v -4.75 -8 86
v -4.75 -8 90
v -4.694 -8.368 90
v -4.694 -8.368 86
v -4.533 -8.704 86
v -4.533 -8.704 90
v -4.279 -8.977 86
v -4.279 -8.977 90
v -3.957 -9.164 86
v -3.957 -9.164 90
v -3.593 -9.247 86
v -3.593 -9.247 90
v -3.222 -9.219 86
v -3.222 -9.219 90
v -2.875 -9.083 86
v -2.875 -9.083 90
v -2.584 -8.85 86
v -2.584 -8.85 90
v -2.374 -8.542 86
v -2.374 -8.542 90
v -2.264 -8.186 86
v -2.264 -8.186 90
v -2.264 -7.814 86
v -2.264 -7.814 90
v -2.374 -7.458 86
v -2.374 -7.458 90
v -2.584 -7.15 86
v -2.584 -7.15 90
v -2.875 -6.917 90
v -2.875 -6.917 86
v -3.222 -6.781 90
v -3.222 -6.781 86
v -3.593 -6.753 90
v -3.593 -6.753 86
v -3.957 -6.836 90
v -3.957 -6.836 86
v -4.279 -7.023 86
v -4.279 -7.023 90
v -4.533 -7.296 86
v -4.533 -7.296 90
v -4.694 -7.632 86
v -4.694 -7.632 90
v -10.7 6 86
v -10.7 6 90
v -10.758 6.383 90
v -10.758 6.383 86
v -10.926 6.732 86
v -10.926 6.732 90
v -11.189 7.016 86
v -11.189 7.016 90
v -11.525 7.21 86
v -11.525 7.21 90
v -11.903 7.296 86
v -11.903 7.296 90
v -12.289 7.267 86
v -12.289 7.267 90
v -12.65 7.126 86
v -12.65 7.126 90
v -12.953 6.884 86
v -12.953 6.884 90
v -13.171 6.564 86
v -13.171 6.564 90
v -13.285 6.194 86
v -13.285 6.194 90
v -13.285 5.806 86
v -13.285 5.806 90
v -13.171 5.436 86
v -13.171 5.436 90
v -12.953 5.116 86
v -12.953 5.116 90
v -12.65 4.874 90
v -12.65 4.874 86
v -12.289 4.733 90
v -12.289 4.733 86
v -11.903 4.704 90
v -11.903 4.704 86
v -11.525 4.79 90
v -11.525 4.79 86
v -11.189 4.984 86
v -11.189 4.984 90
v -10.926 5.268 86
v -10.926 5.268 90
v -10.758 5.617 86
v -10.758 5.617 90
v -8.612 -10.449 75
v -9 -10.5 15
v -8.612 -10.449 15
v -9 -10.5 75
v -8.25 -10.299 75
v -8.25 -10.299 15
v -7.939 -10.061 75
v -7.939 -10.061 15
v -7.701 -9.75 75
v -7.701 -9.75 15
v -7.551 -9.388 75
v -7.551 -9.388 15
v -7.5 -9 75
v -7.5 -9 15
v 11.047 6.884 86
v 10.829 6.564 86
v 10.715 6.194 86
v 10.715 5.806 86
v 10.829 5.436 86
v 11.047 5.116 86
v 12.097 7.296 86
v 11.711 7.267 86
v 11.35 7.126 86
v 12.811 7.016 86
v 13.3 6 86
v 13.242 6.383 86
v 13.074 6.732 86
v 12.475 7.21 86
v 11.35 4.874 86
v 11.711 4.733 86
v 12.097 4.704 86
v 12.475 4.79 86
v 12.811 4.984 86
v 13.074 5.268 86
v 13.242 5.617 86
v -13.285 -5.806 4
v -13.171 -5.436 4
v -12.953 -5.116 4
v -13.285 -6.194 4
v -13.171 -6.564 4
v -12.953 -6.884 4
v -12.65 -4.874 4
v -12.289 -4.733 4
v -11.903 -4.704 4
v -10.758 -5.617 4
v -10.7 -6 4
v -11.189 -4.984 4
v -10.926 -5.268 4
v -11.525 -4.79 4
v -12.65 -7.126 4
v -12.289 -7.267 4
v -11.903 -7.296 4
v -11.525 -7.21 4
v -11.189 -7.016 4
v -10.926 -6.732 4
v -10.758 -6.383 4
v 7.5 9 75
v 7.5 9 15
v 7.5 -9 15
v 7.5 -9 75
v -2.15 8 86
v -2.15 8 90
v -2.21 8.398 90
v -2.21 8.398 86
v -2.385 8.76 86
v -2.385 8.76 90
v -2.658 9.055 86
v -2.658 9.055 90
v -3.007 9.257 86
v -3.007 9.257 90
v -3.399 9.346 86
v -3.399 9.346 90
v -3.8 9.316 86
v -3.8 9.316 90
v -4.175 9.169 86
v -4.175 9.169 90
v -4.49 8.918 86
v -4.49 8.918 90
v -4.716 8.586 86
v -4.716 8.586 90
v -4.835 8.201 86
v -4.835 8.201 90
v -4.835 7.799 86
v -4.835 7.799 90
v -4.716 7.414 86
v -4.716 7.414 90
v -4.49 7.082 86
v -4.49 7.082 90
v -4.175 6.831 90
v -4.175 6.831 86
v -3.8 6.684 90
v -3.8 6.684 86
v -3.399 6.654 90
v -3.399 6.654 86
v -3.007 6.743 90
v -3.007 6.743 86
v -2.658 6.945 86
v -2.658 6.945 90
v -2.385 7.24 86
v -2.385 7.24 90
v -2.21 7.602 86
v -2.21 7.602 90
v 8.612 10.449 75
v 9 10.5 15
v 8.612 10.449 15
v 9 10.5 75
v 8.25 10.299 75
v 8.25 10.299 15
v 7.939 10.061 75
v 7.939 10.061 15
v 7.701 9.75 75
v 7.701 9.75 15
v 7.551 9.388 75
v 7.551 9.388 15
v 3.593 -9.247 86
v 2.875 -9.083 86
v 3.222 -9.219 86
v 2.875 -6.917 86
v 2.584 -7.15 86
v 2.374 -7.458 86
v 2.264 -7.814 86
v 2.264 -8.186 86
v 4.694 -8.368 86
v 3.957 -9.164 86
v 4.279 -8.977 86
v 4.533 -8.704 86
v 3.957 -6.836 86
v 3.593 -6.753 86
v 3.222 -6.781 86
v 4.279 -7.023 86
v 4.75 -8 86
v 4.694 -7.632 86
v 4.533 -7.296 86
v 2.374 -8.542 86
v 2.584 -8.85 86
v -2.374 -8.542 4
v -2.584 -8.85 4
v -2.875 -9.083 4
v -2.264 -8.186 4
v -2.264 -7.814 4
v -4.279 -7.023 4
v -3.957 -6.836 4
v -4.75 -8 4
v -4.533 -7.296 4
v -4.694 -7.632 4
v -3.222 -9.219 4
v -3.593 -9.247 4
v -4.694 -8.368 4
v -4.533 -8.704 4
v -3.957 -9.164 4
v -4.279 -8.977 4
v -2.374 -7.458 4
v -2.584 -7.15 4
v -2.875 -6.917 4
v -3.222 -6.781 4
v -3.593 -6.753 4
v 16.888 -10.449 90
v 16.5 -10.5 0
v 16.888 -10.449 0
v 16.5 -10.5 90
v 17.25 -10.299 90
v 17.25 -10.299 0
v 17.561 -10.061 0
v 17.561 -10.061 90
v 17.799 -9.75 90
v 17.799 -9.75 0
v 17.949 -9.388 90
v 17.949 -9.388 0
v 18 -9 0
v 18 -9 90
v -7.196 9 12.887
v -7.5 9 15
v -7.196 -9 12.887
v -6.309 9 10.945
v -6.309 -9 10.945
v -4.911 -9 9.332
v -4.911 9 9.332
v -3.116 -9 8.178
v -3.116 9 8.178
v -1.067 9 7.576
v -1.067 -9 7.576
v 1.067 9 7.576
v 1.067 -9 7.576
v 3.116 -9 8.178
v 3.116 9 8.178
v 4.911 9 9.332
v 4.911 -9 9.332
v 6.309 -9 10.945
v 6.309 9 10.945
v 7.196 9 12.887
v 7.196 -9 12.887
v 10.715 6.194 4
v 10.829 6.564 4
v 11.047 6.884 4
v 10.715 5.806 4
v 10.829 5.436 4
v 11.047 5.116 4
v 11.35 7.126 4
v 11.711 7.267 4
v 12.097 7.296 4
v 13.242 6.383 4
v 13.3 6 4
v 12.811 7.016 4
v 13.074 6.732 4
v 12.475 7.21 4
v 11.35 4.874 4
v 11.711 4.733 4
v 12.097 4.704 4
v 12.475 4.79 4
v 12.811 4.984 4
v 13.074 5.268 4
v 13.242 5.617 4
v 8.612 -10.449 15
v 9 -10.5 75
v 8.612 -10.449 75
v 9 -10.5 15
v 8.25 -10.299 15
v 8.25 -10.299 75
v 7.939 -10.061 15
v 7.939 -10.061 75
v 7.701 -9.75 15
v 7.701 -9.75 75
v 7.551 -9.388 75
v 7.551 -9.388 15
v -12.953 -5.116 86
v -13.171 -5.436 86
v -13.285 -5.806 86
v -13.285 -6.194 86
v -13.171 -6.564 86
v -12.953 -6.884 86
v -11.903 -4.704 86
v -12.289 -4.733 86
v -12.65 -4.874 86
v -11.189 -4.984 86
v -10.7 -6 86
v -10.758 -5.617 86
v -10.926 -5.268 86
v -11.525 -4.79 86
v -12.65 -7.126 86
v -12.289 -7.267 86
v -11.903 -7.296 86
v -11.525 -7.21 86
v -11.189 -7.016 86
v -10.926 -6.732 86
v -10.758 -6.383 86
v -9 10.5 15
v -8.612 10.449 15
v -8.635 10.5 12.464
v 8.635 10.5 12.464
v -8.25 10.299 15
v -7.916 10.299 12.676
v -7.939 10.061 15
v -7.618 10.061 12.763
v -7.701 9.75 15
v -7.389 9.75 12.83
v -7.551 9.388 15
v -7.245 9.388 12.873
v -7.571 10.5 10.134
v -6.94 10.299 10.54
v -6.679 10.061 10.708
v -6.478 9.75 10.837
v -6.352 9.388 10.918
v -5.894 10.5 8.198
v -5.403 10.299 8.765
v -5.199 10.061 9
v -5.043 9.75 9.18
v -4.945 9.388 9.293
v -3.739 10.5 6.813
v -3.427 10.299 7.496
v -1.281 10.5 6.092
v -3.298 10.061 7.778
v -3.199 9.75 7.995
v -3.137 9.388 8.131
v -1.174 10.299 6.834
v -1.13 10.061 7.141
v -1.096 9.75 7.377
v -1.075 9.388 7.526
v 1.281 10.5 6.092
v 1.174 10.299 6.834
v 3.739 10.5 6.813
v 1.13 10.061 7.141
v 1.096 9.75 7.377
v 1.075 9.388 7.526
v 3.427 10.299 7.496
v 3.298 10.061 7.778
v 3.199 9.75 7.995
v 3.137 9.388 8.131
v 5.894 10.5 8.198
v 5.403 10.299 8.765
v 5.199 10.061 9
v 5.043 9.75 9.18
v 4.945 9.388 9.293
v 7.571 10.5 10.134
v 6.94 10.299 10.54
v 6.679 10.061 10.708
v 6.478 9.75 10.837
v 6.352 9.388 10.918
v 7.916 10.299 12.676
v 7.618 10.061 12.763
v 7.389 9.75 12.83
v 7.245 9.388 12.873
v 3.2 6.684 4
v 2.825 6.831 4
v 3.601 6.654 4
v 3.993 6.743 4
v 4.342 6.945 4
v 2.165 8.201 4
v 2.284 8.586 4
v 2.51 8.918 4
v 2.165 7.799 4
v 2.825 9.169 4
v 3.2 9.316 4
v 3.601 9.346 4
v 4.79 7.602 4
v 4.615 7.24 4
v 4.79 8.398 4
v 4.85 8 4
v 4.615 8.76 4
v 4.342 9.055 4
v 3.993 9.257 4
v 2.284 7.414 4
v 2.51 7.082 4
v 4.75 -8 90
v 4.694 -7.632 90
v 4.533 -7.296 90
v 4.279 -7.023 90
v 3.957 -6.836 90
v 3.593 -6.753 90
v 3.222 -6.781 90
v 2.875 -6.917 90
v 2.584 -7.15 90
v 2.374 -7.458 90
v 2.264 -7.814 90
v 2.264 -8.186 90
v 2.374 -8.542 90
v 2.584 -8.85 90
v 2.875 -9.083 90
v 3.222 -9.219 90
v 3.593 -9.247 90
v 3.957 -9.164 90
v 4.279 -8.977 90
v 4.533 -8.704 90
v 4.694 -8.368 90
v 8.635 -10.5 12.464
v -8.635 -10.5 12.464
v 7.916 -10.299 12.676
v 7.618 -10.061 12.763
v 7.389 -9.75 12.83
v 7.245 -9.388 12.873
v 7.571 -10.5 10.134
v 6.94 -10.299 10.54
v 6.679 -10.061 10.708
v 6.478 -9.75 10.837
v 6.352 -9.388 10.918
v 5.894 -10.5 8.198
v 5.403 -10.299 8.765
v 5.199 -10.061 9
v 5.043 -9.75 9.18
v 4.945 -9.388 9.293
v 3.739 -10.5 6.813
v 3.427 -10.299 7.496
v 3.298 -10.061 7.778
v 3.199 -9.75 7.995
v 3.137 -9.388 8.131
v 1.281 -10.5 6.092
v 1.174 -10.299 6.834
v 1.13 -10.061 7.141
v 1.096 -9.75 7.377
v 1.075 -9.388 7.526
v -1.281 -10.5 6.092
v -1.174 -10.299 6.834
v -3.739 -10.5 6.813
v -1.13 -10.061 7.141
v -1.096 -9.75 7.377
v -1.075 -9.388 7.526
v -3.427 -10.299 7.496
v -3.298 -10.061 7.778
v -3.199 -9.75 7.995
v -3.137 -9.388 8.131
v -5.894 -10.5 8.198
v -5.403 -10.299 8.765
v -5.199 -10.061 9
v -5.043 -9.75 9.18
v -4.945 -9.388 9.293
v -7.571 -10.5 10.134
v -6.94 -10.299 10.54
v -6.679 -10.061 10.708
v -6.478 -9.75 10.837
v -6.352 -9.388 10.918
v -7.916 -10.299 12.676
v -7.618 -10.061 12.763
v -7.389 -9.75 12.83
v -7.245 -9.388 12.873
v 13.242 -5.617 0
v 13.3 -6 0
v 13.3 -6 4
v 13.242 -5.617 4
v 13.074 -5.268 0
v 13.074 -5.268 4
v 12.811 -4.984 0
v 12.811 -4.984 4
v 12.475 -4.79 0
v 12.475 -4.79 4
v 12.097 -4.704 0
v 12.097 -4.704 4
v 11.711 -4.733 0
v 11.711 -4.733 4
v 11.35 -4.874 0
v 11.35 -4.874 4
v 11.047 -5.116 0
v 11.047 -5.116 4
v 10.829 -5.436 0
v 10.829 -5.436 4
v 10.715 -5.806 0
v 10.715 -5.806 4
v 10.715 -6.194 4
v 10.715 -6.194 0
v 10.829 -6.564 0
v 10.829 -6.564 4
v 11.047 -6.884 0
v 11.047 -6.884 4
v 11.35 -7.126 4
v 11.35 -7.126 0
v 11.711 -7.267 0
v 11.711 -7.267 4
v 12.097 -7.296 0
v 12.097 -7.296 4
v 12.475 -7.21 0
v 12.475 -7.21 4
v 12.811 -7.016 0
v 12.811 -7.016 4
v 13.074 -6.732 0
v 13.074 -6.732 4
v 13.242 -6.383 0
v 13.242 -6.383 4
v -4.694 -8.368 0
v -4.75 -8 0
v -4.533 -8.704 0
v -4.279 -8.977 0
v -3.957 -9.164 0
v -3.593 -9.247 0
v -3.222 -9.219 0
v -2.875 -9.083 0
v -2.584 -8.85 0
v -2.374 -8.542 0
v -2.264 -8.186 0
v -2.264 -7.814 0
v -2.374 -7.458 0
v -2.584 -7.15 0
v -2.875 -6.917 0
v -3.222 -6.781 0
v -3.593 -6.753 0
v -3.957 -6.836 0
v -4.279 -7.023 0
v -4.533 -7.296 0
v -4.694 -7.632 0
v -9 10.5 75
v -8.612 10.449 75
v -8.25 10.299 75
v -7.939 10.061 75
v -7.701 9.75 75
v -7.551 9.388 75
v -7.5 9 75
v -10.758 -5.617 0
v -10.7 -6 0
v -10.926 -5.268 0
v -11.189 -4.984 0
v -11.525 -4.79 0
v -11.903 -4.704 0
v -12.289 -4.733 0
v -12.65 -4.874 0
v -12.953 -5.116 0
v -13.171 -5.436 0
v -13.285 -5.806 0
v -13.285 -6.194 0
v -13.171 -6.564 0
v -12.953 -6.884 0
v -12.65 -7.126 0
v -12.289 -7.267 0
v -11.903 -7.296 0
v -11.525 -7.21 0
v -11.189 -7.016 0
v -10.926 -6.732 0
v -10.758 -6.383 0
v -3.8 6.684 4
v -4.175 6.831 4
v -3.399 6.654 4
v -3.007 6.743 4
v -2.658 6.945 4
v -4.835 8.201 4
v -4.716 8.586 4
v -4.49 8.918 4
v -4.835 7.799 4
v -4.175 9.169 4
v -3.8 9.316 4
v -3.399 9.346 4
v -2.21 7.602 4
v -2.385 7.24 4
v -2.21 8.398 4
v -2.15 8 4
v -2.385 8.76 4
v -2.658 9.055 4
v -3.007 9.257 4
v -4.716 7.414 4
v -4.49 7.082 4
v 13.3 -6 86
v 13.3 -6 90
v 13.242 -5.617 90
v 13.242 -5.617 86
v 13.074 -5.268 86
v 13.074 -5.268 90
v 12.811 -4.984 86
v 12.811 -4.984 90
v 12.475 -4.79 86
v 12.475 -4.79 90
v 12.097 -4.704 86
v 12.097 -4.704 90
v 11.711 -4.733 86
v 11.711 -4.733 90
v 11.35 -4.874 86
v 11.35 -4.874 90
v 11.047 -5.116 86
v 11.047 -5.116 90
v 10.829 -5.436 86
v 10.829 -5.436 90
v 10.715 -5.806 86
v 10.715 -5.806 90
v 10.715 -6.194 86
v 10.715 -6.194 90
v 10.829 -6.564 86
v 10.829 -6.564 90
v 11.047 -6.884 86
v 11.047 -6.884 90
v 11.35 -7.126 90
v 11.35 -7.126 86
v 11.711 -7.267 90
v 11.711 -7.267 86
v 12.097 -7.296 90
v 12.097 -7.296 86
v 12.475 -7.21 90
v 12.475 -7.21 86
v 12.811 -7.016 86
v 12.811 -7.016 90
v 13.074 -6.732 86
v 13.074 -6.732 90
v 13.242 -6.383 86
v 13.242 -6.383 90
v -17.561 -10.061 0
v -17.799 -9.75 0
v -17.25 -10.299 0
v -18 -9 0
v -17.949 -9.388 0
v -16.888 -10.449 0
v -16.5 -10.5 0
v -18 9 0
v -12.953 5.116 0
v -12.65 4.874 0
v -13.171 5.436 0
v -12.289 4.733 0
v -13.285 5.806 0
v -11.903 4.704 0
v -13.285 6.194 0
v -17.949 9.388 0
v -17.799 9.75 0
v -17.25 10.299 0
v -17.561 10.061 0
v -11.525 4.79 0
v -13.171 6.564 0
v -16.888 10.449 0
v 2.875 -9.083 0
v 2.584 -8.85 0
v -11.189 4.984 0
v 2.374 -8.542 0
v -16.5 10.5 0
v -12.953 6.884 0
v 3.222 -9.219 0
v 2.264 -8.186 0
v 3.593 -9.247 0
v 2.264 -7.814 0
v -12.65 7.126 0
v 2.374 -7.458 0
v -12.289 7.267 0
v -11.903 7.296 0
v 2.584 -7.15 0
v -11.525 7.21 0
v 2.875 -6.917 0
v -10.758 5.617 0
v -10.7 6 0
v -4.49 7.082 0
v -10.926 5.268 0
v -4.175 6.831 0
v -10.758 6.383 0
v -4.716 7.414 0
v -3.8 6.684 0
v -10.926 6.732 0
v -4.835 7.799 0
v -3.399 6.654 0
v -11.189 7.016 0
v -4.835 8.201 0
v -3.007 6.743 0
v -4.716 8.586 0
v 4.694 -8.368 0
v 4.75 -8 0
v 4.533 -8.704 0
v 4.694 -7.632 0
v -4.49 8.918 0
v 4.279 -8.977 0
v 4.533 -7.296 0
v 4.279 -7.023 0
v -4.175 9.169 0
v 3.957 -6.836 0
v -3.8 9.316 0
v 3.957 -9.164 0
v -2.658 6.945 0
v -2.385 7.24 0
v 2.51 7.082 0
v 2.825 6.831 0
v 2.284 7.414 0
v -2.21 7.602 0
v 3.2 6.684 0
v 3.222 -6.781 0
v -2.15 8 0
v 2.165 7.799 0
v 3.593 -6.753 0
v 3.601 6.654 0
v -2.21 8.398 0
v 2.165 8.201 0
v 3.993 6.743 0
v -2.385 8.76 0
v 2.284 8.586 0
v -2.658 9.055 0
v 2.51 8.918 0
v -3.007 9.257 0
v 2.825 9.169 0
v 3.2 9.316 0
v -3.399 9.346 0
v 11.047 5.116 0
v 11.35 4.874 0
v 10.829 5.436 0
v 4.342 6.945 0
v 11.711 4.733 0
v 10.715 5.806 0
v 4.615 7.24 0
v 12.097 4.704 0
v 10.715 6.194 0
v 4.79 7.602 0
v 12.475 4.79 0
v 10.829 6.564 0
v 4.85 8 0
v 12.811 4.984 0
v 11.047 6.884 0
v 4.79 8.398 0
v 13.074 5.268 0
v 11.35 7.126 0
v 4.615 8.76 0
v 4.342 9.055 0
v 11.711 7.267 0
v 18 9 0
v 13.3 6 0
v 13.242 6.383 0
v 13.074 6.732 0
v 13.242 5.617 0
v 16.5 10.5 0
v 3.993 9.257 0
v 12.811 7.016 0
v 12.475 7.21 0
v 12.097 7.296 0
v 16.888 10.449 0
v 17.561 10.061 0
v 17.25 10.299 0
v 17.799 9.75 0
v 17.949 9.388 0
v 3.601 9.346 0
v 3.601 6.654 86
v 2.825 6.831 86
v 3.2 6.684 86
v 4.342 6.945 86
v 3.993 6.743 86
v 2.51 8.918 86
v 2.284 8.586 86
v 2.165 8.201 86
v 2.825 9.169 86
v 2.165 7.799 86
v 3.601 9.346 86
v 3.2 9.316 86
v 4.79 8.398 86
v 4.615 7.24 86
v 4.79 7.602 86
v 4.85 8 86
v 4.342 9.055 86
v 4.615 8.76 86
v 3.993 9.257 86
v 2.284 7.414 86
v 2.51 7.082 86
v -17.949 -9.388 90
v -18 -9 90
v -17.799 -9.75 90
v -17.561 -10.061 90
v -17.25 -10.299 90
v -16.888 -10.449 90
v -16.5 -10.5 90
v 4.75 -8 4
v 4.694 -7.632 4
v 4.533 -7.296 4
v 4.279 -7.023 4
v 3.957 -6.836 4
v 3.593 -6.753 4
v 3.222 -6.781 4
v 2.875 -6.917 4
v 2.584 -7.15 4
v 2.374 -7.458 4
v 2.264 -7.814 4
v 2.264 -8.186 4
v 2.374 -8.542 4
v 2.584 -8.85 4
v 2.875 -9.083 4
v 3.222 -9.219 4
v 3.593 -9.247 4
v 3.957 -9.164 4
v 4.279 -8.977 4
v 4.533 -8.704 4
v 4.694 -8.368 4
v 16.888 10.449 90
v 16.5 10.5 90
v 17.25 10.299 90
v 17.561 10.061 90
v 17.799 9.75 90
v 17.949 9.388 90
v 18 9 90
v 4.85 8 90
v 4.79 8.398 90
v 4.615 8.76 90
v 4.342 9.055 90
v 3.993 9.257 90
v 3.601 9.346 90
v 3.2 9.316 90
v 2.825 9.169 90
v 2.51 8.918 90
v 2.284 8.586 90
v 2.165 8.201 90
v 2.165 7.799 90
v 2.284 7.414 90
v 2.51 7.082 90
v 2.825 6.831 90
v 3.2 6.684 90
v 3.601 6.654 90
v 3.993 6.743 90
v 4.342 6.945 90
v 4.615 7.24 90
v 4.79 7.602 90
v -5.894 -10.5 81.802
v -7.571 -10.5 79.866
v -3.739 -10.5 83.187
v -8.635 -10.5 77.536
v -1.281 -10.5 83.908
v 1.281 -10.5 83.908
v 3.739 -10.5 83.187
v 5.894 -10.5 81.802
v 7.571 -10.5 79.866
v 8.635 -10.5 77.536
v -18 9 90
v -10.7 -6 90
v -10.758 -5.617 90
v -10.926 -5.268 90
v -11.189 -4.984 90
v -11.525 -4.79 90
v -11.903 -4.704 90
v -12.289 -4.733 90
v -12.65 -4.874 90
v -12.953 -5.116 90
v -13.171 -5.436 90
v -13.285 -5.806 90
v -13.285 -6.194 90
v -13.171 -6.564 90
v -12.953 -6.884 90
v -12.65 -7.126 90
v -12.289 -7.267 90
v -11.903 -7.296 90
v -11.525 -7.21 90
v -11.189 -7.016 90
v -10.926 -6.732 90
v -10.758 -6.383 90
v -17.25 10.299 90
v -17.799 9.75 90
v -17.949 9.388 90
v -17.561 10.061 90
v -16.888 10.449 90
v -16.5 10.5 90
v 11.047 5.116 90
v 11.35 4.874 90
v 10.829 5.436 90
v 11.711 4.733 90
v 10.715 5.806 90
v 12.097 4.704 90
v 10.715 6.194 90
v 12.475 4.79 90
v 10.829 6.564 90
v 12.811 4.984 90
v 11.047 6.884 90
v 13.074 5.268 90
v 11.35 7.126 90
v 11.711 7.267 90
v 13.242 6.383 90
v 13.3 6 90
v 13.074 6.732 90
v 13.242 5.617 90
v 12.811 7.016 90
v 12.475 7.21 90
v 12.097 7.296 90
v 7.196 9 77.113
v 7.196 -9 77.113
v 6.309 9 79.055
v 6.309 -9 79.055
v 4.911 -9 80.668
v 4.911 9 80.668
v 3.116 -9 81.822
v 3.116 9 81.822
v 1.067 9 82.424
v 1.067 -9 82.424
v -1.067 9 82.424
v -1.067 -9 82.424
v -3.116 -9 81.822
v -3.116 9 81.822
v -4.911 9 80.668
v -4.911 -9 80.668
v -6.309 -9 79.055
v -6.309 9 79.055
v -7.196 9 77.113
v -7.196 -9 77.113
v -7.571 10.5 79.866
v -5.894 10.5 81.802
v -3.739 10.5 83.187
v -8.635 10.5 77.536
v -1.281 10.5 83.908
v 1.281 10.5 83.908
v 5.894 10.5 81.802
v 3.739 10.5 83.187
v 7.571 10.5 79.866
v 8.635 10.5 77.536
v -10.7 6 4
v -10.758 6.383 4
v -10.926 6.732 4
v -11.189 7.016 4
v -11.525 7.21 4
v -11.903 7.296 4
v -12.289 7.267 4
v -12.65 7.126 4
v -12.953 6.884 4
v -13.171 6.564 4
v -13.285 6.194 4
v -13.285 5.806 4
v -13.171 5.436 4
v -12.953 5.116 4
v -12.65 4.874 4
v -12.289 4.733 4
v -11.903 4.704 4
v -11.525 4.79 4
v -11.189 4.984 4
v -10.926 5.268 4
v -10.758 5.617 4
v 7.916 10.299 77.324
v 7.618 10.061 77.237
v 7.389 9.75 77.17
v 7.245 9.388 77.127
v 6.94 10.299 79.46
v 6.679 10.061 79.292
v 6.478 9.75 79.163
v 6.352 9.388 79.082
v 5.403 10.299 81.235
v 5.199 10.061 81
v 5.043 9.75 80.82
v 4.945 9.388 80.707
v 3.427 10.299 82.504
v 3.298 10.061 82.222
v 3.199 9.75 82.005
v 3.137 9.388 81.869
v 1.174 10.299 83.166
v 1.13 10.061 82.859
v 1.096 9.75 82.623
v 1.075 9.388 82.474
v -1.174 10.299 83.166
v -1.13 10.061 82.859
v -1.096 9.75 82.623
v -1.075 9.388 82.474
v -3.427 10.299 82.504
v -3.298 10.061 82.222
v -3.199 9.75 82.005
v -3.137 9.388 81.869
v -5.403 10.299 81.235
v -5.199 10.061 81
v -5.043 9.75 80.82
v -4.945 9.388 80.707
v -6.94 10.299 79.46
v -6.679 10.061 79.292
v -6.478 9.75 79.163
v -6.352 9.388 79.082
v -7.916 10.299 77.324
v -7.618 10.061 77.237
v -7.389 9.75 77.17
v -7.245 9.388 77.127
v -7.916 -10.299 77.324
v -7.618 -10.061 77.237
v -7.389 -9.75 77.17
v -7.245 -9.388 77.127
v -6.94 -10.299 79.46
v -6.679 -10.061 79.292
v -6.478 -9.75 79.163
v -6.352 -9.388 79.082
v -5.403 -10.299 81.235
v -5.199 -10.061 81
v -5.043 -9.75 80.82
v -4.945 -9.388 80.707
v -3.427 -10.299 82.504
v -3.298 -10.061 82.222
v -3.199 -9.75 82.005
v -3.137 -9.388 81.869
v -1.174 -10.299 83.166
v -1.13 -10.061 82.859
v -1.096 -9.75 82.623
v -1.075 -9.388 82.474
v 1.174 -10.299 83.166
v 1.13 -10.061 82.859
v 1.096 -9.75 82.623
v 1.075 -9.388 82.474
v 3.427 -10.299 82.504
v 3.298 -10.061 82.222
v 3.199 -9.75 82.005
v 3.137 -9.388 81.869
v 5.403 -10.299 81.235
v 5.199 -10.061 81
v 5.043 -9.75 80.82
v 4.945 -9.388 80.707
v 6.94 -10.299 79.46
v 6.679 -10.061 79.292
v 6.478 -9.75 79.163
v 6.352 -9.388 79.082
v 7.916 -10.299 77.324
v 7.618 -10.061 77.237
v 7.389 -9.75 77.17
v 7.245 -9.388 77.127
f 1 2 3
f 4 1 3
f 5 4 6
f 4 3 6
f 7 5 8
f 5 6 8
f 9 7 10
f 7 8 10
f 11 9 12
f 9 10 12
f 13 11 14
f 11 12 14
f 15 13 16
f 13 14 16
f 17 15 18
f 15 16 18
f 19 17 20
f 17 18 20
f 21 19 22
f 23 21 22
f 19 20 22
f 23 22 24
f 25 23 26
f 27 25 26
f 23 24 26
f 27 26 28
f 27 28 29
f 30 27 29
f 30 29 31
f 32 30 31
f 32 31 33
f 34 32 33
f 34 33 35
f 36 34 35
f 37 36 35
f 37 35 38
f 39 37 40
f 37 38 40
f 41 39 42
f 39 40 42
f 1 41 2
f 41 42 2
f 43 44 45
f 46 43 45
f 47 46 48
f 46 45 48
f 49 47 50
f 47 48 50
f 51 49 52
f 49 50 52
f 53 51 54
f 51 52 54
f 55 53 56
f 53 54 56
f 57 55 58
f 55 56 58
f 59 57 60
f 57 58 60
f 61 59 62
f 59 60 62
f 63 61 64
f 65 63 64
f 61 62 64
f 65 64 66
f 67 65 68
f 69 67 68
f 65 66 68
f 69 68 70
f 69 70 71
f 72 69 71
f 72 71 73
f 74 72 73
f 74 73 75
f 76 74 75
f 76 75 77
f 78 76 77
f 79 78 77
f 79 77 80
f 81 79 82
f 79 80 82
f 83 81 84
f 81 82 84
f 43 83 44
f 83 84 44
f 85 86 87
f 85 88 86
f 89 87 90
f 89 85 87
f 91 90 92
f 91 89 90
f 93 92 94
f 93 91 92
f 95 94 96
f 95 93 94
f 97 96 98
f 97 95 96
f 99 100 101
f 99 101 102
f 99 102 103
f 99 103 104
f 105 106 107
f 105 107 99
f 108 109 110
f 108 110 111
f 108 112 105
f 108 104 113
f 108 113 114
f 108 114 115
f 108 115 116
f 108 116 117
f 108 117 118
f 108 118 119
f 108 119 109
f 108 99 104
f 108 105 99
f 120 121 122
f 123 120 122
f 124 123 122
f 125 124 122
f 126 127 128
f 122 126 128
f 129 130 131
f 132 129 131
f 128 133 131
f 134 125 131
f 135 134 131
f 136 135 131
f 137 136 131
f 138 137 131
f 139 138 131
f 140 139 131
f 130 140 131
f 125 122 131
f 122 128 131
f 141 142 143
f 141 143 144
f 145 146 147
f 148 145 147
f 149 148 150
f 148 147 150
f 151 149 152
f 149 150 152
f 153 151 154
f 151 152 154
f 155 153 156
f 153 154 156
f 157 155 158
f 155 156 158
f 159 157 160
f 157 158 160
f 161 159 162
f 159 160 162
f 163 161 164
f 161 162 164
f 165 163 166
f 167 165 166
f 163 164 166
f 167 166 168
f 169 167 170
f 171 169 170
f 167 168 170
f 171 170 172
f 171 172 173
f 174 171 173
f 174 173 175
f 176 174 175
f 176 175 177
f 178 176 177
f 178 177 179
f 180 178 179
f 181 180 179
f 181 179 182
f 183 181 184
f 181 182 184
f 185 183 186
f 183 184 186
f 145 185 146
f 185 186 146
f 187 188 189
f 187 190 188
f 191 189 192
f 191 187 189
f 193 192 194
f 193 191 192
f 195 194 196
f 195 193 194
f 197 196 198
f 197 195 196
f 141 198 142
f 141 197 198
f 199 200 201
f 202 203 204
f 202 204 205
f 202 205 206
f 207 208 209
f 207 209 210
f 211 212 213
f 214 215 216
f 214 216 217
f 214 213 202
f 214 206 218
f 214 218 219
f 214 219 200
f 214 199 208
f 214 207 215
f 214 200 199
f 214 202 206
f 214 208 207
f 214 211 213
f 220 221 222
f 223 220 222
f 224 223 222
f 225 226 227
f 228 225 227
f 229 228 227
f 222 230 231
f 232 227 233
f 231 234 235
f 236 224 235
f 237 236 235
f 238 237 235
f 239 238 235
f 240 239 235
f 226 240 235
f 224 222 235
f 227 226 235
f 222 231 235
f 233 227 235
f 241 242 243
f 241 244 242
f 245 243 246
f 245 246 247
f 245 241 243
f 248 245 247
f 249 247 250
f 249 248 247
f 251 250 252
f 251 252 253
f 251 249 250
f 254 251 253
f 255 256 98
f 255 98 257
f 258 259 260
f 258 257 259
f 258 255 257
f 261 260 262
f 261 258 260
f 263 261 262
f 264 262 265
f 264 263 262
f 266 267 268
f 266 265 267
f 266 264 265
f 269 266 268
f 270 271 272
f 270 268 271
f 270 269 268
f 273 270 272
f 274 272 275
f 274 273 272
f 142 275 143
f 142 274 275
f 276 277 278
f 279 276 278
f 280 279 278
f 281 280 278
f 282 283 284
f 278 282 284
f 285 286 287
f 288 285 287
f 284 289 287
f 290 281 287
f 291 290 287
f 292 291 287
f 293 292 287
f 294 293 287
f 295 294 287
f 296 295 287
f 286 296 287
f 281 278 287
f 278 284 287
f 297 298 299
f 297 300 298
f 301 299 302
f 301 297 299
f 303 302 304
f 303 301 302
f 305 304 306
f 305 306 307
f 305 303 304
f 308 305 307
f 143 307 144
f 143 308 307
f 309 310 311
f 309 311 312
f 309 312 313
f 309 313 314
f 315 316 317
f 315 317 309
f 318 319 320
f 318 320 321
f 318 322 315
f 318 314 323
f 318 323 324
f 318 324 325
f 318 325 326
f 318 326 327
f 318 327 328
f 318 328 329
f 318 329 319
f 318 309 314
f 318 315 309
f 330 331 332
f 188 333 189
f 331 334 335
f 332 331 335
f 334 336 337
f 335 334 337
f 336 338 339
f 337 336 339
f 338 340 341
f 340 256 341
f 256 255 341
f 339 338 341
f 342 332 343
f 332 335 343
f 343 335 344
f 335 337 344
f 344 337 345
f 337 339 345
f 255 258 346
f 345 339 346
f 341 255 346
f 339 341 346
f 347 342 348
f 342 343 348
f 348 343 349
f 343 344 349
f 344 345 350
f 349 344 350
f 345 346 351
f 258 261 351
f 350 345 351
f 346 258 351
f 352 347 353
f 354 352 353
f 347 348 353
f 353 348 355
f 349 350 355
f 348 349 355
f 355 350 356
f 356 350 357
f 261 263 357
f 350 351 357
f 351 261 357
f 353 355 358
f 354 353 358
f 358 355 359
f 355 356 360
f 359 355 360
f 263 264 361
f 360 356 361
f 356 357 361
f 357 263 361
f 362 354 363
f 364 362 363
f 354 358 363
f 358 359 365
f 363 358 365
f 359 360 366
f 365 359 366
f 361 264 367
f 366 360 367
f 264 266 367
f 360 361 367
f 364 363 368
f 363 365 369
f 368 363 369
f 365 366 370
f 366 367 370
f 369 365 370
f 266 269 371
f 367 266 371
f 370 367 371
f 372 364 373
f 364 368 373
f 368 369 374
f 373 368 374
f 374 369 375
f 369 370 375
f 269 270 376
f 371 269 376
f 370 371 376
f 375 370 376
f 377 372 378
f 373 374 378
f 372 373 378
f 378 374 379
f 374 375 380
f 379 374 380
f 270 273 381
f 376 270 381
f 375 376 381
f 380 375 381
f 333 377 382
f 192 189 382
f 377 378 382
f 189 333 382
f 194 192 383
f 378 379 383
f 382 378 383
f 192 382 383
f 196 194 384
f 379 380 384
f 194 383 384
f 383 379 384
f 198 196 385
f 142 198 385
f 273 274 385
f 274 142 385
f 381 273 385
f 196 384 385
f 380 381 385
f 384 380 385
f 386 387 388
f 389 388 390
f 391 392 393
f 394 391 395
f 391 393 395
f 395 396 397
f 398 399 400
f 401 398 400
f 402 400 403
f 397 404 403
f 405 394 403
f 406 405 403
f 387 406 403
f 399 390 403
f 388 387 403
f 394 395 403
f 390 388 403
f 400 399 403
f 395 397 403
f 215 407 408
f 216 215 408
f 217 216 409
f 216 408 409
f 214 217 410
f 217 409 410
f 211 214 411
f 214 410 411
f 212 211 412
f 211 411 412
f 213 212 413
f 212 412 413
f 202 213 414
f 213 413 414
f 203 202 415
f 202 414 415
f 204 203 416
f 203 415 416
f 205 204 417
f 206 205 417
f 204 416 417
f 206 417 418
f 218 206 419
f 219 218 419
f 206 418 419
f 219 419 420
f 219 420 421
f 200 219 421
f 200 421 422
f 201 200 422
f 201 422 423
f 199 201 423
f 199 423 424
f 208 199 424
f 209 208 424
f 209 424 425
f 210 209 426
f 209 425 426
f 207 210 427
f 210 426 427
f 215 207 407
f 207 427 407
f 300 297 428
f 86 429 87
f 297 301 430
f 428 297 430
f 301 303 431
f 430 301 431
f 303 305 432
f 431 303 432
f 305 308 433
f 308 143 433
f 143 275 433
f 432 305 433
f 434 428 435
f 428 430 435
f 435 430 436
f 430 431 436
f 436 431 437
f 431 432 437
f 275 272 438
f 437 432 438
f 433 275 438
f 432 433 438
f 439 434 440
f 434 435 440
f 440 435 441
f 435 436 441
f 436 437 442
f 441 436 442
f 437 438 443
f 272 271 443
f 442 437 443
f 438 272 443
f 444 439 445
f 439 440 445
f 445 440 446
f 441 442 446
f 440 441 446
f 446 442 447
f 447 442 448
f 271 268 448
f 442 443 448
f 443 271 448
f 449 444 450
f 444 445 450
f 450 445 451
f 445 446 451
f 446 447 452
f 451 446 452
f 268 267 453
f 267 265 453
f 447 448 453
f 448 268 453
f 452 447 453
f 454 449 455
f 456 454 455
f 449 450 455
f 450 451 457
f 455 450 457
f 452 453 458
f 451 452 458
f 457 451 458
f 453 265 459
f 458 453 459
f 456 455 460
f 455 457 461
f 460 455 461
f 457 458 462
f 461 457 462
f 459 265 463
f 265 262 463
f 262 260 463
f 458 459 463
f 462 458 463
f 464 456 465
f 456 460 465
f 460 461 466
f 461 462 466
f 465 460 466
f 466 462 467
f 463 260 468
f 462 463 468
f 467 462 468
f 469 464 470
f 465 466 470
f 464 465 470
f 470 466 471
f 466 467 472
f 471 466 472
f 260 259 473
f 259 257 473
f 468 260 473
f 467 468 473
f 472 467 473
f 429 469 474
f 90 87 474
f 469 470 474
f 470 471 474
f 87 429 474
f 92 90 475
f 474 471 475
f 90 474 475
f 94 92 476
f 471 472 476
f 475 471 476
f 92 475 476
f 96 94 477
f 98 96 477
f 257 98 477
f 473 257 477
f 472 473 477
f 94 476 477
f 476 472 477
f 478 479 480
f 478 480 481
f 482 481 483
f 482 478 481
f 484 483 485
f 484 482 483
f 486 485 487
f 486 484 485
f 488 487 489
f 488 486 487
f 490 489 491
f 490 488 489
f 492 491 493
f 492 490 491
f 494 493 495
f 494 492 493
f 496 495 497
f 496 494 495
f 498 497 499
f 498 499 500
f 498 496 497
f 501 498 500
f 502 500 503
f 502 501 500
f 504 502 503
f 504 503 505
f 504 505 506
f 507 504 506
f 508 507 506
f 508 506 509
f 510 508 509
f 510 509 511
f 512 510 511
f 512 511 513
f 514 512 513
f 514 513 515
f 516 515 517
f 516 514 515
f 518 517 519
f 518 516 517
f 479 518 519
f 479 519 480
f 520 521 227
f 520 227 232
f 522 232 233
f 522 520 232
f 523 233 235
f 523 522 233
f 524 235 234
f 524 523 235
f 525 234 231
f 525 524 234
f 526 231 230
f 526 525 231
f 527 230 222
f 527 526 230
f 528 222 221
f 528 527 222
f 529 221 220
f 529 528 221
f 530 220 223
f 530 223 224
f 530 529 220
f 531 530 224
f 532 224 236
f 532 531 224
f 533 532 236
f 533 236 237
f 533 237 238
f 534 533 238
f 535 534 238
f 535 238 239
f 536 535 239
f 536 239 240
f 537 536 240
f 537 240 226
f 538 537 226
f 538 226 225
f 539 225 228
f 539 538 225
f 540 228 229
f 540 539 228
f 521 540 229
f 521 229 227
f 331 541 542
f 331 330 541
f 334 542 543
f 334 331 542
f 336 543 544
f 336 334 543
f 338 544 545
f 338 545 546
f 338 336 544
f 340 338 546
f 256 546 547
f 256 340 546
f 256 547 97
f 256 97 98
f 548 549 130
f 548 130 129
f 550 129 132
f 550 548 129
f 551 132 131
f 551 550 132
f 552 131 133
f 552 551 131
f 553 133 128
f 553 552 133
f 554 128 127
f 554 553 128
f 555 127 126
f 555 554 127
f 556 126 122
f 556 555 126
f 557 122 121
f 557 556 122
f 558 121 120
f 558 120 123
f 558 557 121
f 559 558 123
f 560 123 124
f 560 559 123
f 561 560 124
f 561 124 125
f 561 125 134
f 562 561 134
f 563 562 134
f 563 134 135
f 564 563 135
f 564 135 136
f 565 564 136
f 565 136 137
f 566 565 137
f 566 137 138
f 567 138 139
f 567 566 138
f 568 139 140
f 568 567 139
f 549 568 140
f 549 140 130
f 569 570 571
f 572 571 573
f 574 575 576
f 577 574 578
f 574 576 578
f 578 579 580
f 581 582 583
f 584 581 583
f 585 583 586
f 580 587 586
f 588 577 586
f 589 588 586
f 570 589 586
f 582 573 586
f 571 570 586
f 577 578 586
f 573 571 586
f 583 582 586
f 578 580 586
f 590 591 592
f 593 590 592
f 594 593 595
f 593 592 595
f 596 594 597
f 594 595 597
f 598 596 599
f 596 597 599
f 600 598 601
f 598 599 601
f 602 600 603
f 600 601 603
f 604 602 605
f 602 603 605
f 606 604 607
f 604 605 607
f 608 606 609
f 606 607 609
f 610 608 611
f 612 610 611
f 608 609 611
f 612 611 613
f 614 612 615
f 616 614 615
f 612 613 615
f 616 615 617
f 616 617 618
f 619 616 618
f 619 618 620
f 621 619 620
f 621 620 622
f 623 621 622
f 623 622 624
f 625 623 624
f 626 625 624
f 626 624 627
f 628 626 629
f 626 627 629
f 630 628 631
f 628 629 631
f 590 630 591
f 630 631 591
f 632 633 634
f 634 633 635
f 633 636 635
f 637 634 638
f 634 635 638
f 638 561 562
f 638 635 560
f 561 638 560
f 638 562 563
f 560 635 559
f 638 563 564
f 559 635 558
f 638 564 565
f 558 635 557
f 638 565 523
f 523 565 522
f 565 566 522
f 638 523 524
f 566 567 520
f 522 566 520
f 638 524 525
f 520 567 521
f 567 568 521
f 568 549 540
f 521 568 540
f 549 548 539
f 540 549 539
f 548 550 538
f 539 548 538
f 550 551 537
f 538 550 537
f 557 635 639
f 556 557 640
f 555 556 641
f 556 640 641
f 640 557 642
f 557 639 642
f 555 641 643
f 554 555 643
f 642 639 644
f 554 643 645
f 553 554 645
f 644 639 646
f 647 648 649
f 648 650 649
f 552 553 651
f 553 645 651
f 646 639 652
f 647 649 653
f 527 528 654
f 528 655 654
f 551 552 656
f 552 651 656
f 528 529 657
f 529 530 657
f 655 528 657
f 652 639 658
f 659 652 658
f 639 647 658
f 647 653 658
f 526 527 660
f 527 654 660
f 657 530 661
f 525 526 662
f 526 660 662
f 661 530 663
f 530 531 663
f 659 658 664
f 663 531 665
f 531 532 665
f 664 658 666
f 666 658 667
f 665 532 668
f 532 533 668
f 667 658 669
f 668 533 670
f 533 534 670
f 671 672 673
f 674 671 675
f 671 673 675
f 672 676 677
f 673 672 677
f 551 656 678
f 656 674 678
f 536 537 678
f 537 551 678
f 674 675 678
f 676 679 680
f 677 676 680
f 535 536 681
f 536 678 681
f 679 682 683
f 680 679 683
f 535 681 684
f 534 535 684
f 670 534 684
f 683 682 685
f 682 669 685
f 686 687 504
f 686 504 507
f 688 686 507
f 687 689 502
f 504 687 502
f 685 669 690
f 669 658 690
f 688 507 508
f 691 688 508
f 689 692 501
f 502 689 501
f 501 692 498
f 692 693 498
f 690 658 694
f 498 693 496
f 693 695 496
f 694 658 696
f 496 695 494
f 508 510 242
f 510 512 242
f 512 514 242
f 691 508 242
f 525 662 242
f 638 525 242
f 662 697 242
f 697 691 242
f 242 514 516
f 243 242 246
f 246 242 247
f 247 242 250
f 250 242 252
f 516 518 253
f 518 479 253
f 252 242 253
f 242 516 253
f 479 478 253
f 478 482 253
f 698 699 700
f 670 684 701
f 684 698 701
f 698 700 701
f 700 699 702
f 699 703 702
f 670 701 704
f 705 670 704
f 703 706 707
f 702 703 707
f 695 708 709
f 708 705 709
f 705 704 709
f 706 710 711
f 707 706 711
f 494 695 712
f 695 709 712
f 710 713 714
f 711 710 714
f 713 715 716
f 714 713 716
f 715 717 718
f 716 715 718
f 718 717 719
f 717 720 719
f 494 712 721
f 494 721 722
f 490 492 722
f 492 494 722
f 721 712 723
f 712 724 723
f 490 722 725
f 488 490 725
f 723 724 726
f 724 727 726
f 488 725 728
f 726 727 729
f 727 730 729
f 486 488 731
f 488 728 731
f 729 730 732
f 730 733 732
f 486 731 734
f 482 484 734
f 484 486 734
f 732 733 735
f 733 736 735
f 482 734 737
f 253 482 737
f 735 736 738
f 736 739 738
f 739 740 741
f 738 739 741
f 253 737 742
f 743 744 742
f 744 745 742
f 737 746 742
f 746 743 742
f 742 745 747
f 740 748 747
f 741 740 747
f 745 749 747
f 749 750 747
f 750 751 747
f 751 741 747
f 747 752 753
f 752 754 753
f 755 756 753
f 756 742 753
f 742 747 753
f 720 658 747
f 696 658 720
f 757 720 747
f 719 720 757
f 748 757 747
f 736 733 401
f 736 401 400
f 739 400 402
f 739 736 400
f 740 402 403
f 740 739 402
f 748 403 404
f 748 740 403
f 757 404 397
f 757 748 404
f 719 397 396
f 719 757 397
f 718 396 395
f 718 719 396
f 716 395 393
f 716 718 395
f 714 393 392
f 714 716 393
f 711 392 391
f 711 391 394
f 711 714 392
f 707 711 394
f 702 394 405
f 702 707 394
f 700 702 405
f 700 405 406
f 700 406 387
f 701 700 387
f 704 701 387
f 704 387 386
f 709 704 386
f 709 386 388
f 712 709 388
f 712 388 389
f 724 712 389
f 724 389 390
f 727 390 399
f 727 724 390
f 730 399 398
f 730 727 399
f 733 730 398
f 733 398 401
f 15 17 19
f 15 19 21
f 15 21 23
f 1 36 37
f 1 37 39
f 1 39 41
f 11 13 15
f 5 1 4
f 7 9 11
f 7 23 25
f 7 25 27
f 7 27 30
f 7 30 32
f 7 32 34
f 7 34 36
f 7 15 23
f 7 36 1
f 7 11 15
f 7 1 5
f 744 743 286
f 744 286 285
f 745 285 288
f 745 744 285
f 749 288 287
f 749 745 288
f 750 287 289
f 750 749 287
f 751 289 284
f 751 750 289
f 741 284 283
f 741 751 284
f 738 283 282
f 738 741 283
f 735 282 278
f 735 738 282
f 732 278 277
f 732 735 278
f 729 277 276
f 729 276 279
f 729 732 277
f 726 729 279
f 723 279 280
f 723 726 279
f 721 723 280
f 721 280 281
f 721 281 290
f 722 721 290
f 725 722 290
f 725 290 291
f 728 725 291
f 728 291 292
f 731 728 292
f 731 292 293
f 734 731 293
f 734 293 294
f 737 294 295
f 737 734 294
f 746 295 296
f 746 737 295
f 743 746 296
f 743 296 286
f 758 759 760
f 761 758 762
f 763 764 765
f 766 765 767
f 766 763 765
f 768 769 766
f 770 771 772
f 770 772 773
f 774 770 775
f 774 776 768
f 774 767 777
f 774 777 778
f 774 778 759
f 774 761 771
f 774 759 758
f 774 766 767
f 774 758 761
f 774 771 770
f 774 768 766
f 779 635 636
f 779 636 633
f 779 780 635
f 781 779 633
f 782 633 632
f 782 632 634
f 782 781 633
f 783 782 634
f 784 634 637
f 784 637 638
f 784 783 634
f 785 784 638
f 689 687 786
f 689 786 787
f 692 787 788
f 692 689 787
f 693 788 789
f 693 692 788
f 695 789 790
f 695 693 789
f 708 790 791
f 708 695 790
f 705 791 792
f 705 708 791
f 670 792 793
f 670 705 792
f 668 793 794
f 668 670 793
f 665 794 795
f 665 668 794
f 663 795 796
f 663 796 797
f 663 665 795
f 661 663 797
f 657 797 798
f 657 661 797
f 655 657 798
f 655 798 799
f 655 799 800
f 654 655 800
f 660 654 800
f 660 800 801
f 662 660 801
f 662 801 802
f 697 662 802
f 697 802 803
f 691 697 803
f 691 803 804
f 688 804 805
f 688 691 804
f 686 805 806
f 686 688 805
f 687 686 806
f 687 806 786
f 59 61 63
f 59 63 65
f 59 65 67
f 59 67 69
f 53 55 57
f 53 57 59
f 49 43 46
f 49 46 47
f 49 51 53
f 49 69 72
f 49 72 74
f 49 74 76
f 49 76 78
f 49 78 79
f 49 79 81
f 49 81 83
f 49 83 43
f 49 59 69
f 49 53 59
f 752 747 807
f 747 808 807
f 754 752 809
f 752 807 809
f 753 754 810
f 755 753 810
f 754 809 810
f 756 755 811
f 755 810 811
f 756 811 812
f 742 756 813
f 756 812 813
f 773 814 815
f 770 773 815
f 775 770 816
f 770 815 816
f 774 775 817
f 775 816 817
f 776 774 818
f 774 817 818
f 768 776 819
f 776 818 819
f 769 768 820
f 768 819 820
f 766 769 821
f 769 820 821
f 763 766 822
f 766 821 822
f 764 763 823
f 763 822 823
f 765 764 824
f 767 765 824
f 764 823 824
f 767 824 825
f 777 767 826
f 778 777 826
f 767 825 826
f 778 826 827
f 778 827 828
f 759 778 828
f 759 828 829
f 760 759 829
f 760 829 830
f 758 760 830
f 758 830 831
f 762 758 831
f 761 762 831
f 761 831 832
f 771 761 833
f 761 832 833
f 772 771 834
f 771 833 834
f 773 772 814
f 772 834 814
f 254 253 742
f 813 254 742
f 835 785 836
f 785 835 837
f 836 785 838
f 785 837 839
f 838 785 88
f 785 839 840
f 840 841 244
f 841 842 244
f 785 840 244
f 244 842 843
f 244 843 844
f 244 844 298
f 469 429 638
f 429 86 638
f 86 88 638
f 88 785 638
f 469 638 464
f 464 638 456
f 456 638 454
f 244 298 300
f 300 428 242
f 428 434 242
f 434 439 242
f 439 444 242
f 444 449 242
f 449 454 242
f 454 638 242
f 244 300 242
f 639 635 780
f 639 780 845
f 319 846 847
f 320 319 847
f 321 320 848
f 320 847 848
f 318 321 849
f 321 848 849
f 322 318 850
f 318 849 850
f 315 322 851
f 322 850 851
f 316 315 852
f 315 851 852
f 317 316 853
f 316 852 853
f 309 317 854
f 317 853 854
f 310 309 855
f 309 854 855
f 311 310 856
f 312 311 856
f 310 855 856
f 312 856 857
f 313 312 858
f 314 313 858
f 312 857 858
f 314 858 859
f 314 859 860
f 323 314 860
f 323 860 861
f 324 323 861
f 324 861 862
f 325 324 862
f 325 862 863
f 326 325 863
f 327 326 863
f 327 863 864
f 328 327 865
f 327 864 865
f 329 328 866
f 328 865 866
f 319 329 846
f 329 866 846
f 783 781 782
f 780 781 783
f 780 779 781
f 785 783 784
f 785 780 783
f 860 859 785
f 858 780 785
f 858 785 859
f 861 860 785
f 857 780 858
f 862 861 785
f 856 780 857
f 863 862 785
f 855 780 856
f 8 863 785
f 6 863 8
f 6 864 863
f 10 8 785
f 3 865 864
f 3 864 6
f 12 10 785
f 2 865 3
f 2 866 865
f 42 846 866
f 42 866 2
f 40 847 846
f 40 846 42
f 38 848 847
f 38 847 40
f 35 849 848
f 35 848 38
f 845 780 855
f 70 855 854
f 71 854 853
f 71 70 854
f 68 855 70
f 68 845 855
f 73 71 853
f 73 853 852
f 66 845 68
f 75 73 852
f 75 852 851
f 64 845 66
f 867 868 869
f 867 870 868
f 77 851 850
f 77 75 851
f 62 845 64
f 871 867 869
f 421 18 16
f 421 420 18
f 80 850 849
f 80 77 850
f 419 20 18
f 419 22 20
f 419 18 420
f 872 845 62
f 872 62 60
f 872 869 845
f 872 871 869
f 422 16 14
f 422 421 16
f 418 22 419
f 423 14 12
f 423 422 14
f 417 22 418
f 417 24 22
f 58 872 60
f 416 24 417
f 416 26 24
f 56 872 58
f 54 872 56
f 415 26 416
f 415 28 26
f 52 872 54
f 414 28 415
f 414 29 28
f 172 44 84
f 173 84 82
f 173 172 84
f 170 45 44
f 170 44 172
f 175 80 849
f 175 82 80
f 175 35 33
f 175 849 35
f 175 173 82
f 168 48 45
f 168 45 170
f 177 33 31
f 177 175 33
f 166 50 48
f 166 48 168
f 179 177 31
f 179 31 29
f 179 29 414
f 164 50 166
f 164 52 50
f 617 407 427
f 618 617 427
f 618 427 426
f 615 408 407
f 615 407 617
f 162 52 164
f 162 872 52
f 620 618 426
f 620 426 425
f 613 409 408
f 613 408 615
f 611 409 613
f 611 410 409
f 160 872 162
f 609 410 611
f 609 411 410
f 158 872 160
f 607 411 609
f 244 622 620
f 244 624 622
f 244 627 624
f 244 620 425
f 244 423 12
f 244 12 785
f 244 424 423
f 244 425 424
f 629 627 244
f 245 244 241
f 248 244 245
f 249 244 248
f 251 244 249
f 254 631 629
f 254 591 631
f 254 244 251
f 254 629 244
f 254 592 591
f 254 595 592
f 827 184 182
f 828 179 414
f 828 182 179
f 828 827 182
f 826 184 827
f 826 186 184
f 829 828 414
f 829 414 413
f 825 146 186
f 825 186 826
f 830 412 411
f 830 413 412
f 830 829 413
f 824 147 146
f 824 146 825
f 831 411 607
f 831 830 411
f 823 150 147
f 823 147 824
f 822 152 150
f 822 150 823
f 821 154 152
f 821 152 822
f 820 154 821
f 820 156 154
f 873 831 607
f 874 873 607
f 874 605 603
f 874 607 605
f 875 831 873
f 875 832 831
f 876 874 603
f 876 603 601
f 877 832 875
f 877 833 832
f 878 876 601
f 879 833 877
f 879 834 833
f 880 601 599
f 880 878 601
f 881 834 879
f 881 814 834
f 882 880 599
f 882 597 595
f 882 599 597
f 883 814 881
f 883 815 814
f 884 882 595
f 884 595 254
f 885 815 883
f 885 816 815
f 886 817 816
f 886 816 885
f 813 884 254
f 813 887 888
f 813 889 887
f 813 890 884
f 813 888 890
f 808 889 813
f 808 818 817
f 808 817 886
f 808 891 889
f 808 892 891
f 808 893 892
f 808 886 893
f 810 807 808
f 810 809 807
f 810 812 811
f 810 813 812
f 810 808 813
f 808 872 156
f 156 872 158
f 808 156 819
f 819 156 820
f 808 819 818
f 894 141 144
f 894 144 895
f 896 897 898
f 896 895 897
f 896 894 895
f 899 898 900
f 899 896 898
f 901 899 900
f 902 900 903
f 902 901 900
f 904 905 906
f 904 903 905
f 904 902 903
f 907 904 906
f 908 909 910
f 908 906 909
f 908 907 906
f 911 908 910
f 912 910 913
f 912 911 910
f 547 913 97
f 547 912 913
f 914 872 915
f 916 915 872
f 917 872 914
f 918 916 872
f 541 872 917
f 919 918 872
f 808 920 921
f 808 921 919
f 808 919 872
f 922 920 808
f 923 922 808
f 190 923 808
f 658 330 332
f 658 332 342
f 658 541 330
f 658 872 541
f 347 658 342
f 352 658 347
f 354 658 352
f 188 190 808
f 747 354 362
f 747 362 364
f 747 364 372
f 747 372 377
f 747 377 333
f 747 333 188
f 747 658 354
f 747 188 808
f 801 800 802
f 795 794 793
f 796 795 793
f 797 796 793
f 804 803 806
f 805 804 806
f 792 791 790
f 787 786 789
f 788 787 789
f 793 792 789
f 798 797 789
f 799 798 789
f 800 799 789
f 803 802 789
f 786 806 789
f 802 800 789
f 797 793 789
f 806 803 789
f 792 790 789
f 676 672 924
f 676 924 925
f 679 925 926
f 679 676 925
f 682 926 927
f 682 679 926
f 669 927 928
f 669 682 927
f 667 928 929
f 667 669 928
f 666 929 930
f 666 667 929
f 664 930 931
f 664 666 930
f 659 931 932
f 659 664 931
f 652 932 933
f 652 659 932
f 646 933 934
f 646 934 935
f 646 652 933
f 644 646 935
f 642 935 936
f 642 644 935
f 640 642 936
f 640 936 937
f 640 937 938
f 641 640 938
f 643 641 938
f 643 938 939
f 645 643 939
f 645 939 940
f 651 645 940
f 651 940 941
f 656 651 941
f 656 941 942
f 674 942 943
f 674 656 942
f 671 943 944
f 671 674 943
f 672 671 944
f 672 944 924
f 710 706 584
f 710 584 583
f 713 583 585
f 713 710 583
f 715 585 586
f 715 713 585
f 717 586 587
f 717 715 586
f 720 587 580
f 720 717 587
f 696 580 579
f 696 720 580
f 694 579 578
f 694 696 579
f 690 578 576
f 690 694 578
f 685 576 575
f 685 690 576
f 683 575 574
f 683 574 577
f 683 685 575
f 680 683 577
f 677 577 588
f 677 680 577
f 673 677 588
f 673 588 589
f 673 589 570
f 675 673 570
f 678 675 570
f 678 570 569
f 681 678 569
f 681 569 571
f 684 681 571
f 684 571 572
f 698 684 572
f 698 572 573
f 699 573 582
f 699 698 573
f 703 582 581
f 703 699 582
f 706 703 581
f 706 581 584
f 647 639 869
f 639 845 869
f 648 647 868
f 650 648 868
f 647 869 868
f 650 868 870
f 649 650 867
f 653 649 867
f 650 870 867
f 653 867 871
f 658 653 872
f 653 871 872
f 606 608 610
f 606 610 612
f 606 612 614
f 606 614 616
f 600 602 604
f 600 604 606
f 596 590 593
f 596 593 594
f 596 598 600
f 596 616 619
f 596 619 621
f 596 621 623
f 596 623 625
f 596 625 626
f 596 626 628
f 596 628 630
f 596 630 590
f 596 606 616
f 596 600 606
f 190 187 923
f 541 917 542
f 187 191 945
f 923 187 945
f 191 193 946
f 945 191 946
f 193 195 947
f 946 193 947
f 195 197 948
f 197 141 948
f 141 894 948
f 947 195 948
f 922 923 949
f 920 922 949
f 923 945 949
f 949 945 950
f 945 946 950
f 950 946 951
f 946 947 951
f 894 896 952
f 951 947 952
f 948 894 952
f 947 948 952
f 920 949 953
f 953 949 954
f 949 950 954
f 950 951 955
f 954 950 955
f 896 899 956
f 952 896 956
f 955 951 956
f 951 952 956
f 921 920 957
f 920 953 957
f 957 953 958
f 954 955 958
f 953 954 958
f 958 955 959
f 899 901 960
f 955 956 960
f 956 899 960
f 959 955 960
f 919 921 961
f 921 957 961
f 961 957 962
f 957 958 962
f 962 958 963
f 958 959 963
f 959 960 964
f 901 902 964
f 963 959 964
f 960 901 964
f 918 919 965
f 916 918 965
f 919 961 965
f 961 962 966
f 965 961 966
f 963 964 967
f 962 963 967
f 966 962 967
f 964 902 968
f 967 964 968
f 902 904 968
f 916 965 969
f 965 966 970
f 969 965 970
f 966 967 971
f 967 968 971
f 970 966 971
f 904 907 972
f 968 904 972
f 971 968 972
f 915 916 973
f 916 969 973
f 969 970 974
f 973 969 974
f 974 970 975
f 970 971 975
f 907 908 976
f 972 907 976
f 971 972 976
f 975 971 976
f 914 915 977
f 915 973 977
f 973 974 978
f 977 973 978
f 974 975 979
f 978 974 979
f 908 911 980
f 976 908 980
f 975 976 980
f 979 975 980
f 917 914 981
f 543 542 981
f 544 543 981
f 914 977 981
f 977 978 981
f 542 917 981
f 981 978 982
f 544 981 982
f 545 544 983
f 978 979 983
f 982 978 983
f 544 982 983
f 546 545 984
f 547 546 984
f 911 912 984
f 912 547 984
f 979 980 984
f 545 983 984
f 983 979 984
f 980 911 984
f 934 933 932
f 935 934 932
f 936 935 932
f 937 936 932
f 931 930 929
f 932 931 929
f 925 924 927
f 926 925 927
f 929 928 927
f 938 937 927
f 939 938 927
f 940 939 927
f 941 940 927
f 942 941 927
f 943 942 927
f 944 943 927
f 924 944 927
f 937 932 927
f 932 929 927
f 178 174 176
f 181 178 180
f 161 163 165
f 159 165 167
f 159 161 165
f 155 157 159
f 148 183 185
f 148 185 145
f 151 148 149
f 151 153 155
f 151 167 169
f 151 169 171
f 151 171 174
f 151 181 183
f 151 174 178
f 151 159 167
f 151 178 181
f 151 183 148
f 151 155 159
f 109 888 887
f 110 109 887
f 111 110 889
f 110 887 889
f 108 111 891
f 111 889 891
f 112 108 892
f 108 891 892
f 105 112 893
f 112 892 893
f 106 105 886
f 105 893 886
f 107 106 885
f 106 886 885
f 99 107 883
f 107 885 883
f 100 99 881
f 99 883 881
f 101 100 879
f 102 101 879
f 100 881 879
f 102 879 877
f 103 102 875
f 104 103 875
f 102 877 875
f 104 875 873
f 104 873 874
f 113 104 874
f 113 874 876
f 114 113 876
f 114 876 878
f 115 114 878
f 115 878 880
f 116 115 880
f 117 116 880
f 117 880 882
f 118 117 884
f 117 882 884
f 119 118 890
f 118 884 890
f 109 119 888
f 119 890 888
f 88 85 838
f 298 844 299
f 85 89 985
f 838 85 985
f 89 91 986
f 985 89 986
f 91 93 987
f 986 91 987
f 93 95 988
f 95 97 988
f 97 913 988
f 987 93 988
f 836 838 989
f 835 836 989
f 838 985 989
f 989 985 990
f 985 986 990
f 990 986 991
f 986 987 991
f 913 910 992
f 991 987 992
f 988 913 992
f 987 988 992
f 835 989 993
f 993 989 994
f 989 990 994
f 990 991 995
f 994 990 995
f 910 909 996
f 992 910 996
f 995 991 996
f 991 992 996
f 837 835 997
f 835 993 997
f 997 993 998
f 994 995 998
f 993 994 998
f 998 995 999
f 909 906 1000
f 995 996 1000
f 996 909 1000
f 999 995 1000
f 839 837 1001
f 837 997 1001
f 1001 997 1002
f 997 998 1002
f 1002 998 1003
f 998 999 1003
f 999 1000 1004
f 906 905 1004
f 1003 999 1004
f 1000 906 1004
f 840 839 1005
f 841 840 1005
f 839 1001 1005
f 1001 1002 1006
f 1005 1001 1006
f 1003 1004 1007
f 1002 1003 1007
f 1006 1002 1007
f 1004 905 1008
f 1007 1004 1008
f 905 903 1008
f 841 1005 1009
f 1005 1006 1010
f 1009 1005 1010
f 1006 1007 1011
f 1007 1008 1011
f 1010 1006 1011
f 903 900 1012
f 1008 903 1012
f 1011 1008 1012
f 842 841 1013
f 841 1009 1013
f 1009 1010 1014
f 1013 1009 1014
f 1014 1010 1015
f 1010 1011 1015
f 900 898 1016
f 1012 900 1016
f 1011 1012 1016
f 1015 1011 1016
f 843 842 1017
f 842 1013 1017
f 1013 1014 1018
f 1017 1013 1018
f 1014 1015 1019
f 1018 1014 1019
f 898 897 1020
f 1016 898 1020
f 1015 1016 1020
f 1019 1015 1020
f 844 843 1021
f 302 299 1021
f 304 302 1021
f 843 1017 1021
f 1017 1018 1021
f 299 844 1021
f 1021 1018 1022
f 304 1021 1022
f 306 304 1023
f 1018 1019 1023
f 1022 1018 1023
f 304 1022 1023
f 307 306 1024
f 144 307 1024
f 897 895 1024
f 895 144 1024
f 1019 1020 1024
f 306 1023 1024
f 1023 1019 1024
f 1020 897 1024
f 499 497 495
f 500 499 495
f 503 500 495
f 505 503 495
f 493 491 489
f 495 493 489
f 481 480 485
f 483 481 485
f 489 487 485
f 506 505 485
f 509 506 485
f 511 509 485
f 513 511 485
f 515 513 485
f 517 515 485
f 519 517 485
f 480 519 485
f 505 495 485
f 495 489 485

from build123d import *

# Parameters (mm, degrees)
SKETCH_1_W          = 36
SKETCH_1_H          = 21
SKETCH_1_R          = 1.25
SKETCH_1_R_2        = 1.3
SKETCH_1_R_3        = 1.35
EXTRUDE_1_DEPTH     = 90
SKETCH_1_5_R        = 1.3
SKETCH_1_5_R_2      = 1.35
SKETCH_1_5_R_3      = 1.25
CUT_EXTRUDE_1_DEPTH = 4
CUT_EXTRUDE_START   = 90
SKETCH_1_6_R        = 1.35
SKETCH_1_6_R_2      = 1.3
SKETCH_1_6_R_3      = 1.25
CUT_EXTRUDE_2_DEPTH = 4
CUT_EXTRUDE_3_REACH = 96.154
FILLET_1_R          = 1.5


with BuildPart() as part:
    # 스케치1 → 보스-돌출1 (new body)
    with BuildSketch(Plane.XY):
        Rectangle(SKETCH_1_W, SKETCH_1_H)
        with Locations((-3.5, -8)):
            Circle(SKETCH_1_R, mode=Mode.SUBTRACT)
        with Locations((3.5, -8)):
            Circle(SKETCH_1_R, mode=Mode.SUBTRACT)
        with Locations((-12, 6)):
            Circle(SKETCH_1_R_2, mode=Mode.SUBTRACT)
        with Locations((12, 6)):
            Circle(SKETCH_1_R_2, mode=Mode.SUBTRACT)
        with Locations((12, -6)):
            Circle(SKETCH_1_R_2, mode=Mode.SUBTRACT)
        with Locations((-12, -6)):
            Circle(SKETCH_1_R_2, mode=Mode.SUBTRACT)
        with Locations((3.5, 8)):
            Circle(SKETCH_1_R_3, mode=Mode.SUBTRACT)
        with Locations((-3.5, 8)):
            Circle(SKETCH_1_R_3, mode=Mode.SUBTRACT)
        with Locations((12, -6)):
            Circle(SKETCH_1_R_2)
        with Locations((3.5, -8)):
            Circle(SKETCH_1_R)
        with Locations((-3.5, -8)):
            Circle(SKETCH_1_R)
        with Locations((-12, -6)):
            Circle(SKETCH_1_R_2)
        with Locations((-12, 6)):
            Circle(SKETCH_1_R_2)
        with Locations((-3.5, 8)):
            Circle(SKETCH_1_R_3)
        with Locations((3.5, 8)):
            Circle(SKETCH_1_R_3)
        with Locations((12, 6)):
            Circle(SKETCH_1_R_2)
    extrude(amount=EXTRUDE_1_DEPTH)

    # 스케치1<5> → 컷-돌출1 (cut)
    with BuildSketch(Plane.XY):
        with Locations((12, 6)):
            Circle(SKETCH_1_5_R)
        with Locations((3.5, 8)):
            Circle(SKETCH_1_5_R_2)
        with Locations((-3.5, 8)):
            Circle(SKETCH_1_5_R_2)
        with Locations((-12, 6)):
            Circle(SKETCH_1_5_R)
        with Locations((-12, -6)):
            Circle(SKETCH_1_5_R)
        with Locations(Location((-3.5, -8, 0), (0, 0, 180))):
            Circle(SKETCH_1_5_R_3)
        with Locations((3.5, -8)):
            Circle(SKETCH_1_5_R_3)
        with Locations((12, -6)):
            Circle(SKETCH_1_5_R)
    extrude(amount=CUT_EXTRUDE_1_DEPTH, mode=Mode.SUBTRACT)

    # 스케치1<6> → 컷-돌출2 (cut)
    with BuildSketch(Plane.XY.offset(CUT_EXTRUDE_START)):
        with Locations((3.5, 8)):
            Circle(SKETCH_1_6_R)
        with Locations((12, 6)):
            Circle(SKETCH_1_6_R_2)
        with Locations((-3.5, 8)):
            Circle(SKETCH_1_6_R)
        with Locations((-12, 6)):
            Circle(SKETCH_1_6_R_2)
        with Locations((-12, -6)):
            Circle(SKETCH_1_6_R_2)
        with Locations(Location((-3.5, -8, 0), (0, 0, 180))):
            Circle(SKETCH_1_6_R_3)
        with Locations((3.5, -8)):
            Circle(SKETCH_1_6_R_3)
        with Locations((12, -6)):
            Circle(SKETCH_1_6_R_2)
    extrude(amount=-CUT_EXTRUDE_2_DEPTH, mode=Mode.SUBTRACT)

    # 스케치2 → 컷-돌출3 (cut, up to next)
    with BuildSketch(Plane(origin=(0, 10.5, 0), x_dir=(1, 0, 0), z_dir=(0, 1, 0)), mode=Mode.PRIVATE) as cut_extrude_3_sk1:
        with BuildLine():
            Line((7.5, -15), (7.5, -75))
            ThreePointArc((7.5, -75), (0, -82.5), (-7.5, -75))
            Line((-7.5, -75), (-7.5, -15))
            ThreePointArc((-7.5, -15), (0, -7.5), (7.5, -15))
        make_face()
    cut_extrude_3_tool1 = extrude(cut_extrude_3_sk1.sketch, amount=-CUT_EXTRUDE_3_REACH, mode=Mode.PRIVATE) & part.part
    add(cut_extrude_3_tool1.solids().sort_by_distance((0, 10.5, 45))[0], mode=Mode.SUBTRACT)

    # 필렛1
    fillet_1_edges = [part.edges().sort_by_distance(p)[0] for p in [
        (0, -10.5, 7.5),
        (7.5, -10.5, 45),
        (0, -10.5, 82.5),
        (-7.5, -10.5, 45),
        (0, 10.5, 7.5),
        (-7.5, 10.5, 45),
        (0, 10.5, 82.5),
        (7.5, 10.5, 45),
        (-18, 10.5, 45),
        (18, 10.5, 45),
        (18, -10.5, 45),
        (-18, -10.5, 45),
    ]]
    fillet(fillet_1_edges, radius=FILLET_1_R)


solid = part.part
